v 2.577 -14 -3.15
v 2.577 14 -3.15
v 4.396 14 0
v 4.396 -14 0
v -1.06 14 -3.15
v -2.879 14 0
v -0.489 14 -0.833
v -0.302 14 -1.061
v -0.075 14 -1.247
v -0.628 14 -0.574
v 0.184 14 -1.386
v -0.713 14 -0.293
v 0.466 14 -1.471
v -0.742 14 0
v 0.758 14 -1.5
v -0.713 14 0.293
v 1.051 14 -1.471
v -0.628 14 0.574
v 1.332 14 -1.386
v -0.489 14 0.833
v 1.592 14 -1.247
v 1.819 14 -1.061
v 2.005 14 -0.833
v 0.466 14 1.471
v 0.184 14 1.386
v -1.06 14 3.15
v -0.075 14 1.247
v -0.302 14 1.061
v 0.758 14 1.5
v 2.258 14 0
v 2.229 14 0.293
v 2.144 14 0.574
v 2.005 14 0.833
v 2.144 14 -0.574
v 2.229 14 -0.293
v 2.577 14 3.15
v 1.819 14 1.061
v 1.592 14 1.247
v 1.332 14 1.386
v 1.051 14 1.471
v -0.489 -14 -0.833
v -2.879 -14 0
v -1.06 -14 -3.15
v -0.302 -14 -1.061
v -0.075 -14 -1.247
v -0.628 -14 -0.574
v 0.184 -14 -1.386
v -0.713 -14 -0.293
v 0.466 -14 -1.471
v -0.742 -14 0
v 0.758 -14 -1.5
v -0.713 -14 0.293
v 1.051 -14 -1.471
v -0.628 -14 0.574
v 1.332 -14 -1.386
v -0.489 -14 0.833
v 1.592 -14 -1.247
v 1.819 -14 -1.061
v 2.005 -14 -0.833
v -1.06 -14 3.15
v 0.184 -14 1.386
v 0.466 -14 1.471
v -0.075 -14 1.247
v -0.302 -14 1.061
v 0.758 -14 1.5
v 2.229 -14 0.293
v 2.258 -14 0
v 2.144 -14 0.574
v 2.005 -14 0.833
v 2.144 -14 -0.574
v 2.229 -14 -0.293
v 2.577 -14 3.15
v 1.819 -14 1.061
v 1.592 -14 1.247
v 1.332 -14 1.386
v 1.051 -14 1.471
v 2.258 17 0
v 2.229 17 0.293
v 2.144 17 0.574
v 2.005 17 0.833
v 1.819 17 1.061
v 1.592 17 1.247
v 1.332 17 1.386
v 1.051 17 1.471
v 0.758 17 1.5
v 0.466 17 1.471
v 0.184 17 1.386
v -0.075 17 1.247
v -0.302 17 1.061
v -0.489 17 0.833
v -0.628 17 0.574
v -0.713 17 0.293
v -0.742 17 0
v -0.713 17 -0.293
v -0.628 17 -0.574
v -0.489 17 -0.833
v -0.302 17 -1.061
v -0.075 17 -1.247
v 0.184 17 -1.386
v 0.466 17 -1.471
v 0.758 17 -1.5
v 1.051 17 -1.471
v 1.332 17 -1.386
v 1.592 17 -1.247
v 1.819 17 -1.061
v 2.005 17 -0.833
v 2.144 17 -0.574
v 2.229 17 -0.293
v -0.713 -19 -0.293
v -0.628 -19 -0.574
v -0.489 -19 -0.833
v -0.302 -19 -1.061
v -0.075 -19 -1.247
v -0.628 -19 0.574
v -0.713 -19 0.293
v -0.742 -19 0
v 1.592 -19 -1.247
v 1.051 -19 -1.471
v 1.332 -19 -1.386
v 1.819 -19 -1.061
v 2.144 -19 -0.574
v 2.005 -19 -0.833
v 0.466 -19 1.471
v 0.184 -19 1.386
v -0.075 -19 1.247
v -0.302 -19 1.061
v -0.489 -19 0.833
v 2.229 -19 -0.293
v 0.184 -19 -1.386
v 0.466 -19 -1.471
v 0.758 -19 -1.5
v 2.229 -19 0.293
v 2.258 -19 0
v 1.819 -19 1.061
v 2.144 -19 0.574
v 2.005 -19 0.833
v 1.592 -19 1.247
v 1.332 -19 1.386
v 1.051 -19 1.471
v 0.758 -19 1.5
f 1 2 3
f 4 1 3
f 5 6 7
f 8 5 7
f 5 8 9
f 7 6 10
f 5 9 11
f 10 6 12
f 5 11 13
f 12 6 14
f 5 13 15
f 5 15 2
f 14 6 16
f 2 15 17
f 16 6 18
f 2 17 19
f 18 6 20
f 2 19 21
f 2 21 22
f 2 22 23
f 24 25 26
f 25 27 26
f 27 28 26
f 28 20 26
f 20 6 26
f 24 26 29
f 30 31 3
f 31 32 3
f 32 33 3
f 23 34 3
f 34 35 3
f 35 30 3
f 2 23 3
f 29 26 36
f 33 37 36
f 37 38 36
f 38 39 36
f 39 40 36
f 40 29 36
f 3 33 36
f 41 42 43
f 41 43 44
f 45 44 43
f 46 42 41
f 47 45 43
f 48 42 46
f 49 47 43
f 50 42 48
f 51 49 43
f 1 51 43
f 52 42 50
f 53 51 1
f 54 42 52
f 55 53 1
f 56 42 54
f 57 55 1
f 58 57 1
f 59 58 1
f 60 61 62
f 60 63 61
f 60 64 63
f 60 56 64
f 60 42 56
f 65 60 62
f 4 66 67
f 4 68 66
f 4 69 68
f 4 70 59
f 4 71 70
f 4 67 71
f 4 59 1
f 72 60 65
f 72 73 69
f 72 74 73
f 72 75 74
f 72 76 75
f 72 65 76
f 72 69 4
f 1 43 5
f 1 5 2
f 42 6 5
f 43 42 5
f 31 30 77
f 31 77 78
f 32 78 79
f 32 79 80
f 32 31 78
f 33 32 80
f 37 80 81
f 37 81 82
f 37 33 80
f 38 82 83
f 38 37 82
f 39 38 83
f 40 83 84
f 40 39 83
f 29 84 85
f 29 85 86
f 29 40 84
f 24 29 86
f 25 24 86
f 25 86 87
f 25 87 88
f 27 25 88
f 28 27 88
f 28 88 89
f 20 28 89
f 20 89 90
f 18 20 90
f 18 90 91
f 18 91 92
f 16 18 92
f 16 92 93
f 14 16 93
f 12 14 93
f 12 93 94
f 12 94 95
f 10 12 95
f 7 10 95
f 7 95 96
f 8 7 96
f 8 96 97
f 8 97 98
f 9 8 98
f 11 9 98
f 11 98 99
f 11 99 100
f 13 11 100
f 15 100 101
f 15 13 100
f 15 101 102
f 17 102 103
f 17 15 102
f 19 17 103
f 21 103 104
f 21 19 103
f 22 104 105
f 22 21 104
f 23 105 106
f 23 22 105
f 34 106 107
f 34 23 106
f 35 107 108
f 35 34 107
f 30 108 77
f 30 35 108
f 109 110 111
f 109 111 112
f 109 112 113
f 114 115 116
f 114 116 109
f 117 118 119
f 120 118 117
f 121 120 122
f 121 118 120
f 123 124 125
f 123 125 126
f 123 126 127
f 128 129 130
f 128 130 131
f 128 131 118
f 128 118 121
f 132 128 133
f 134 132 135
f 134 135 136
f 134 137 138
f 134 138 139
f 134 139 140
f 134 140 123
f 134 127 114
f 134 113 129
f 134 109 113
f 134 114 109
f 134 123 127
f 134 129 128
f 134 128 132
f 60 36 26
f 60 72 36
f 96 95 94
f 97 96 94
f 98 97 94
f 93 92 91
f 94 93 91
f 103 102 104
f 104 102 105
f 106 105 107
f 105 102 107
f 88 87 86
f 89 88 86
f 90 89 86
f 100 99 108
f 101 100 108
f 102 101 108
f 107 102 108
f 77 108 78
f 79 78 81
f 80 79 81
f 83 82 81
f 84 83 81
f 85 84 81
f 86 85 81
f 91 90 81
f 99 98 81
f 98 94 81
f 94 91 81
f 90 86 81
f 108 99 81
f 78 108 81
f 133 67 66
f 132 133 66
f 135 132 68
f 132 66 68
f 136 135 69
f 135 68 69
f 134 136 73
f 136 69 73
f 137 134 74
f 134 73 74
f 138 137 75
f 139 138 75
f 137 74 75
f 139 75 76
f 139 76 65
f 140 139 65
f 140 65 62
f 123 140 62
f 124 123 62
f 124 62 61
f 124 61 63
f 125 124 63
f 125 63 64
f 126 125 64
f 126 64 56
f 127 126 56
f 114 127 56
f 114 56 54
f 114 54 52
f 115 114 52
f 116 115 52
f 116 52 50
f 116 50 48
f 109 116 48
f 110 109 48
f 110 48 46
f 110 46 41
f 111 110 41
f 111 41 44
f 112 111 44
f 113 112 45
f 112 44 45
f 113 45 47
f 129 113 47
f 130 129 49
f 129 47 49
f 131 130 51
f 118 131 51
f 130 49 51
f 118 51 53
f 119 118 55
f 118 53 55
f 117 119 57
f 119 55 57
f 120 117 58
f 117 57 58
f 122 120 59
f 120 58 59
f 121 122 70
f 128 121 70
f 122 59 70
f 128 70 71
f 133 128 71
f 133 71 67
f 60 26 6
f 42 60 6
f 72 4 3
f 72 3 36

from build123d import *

# Parameters (mm, degrees)
F0_R     = 1.5
F1_DEPTH = 14
F2_DEPTH = 19
F3_DEPTH = 17


with BuildPart() as f1:
    # F0 (on Front) → F1 (new body, symmetric)
    with BuildSketch(Plane.XZ):
        Polygon((-2.879062, 0), (-1.060408, -3.15), (2.576898, -3.15), (4.395552, 0), (2.576898, 3.15), (-1.060408, 3.15), align=None)
        with Locations((0.758245, 0)):
            Circle(F0_R, mode=Mode.SUBTRACT)
    extrude(amount=F1_DEPTH, both=True)

    # F0 (on Front) → F2 (join)
    with BuildSketch(Plane.XZ):
        with Locations((0.758245, 0)):
            Circle(F0_R)
    extrude(amount=F2_DEPTH)

    # F0 (on Front) → F3 (join)
    with BuildSketch(Plane.XZ):
        with Locations((0.758245, 0)):
            Circle(F0_R)
    extrude(amount=-F3_DEPTH)


solid = f1.part
